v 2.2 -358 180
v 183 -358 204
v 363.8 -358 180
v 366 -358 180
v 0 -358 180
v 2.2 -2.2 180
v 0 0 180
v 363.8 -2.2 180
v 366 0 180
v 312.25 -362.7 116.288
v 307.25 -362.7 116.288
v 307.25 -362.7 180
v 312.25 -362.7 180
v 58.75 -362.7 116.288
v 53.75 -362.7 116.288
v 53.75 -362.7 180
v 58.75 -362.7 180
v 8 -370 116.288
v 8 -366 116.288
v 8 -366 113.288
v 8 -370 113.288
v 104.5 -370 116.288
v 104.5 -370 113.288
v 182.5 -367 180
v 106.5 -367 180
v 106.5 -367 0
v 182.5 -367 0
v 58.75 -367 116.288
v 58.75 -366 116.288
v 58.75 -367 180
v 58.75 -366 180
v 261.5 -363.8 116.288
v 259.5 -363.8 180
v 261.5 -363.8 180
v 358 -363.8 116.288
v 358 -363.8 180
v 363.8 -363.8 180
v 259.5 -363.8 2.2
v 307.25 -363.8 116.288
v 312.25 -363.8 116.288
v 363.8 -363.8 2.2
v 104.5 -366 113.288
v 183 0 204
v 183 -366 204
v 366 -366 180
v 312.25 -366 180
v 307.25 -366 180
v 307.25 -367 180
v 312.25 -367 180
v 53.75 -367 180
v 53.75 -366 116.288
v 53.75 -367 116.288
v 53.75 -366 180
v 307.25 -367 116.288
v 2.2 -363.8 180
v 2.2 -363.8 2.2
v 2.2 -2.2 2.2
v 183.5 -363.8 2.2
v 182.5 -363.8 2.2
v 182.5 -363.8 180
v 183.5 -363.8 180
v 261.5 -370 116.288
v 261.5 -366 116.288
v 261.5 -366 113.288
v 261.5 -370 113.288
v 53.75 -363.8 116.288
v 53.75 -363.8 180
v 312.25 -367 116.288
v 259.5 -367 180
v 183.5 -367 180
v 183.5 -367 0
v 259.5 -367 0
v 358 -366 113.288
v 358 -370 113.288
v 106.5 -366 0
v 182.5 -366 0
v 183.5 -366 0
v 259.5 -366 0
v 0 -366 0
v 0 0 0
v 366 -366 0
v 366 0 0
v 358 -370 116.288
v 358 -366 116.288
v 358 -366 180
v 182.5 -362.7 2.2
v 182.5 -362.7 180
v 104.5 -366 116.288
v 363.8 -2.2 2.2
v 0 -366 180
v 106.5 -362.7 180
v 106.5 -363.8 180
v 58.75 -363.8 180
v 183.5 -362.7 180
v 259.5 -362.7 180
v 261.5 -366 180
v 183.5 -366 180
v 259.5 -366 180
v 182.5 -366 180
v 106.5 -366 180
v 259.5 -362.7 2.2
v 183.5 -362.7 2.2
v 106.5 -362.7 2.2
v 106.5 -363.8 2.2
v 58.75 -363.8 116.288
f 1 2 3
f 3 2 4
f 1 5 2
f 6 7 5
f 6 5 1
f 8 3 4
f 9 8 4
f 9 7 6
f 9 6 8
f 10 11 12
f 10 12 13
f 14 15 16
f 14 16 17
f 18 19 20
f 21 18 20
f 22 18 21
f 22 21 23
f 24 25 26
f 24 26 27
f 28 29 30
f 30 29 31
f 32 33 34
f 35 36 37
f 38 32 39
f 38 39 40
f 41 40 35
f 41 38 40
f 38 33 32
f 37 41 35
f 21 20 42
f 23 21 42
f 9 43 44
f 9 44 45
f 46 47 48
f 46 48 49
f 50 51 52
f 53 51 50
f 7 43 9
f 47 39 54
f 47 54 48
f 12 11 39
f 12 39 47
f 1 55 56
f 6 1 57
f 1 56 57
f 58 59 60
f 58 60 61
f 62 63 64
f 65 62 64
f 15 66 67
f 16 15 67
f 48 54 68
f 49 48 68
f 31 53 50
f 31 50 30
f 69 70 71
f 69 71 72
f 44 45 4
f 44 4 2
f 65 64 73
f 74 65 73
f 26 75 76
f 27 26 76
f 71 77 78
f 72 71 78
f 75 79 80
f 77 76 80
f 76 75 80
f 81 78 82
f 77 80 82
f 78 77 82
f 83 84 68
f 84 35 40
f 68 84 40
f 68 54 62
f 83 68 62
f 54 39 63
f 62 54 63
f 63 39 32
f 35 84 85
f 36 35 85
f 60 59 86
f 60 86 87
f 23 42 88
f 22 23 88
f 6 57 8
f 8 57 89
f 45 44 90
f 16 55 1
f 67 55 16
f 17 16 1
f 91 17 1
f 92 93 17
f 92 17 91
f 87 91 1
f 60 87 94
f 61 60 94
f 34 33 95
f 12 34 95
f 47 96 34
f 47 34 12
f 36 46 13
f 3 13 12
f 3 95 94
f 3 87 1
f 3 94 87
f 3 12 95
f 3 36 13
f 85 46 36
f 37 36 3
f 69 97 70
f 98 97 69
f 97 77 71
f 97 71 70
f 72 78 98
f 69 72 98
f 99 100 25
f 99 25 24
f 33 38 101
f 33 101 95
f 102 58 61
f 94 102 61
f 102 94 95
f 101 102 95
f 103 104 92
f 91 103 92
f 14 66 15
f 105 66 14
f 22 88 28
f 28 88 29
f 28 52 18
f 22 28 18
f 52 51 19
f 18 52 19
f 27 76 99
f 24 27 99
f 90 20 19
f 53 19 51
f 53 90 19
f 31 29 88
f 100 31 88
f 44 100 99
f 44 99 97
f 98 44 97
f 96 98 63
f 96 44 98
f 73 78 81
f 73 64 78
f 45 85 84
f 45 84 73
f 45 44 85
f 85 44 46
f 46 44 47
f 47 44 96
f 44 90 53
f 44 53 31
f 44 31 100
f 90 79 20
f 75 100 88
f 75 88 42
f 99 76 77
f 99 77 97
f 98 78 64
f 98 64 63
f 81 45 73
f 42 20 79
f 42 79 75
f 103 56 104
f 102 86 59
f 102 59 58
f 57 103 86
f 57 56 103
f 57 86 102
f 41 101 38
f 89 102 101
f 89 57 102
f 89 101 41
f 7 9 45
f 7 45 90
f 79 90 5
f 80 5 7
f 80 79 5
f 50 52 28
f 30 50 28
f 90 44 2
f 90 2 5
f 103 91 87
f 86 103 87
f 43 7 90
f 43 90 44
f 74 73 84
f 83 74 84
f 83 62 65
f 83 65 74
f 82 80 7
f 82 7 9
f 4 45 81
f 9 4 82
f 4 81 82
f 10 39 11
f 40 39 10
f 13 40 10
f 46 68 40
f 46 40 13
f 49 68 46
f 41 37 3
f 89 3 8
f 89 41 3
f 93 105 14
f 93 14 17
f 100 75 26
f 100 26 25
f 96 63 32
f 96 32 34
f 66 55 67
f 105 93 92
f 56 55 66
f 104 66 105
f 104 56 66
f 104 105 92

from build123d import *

# Parameters (mm, degrees)
F0_W          = 366
F0_H          = 366
F0_W_2        = 361.6
F0_H_2        = 361.6
F1_DEPTH      = 180
F2_DEPTH      = 2.2
F3_W          = 76
F3_H          = 180
F3_W_2        = 5
F3_H_2        = 63.7124854326
F4_DEPTH      = 1
F4_DEPTH_BACK = 3.3
F3_W_3        = 45.75
F5_DEPTH      = 25
F6_DEPTH      = 8
F7_DEPTH      = 4
F9_DEPTH      = 366


# Not quite as in the source:
# - a feature names something its author has since deleted; it is built from what else it names


with BuildPart() as f1:
    # F0 (on Top) → F1 (new body)
    with BuildSketch(Plane.XY):
        with Locations((183, -183)):
            Rectangle(F0_W, F0_H)
        with Locations((183, -183)):
            Rectangle(F0_W_2, F0_H_2, mode=Mode.SUBTRACT)
    extrude(amount=F1_DEPTH)

    # F0 (on Top) → F2 (join)
    with BuildSketch(Plane.XY):
        with Locations((183, -183)):
            Rectangle(F0_W_2, F0_H_2)
    extrude(amount=F2_DEPTH)

    # F3 (on face) → F4 (join, two sides)
    with BuildSketch(Plane.XZ.offset(366)) as f4_sk:
        with Locations((144.5, 90)):
            Rectangle(F3_W, F3_H)
        with Locations((221.5, 90)):
            Rectangle(F3_W, F3_H)
        with Locations((56.25, 148.1437572837)):
            Rectangle(F3_W_2, F3_H_2)
        with Locations((309.75, 148.1437572837)):
            Rectangle(F3_W_2, F3_H_2)
    extrude(amount=F4_DEPTH)
    extrude(f4_sk.sketch, amount=-F4_DEPTH_BACK)

    # F3 (on face) → F5 (cut)
    with BuildSketch(Plane.XZ.offset(366)):
        Polygon((104.5, 180), (106.5, 180), (182.5, 180), (183.5, 180), (259.5, 180), (261.5, 180), (307.25, 180), (312.25, 180), (358, 180), (366, 180), (183, 204), (0, 180), (8, 180), (53.75, 180), (58.75, 180), align=None)
        with Locations((284.375, 148.1437572837)):
            Rectangle(F3_W_3, F3_H_2)
        with Locations((335.125, 148.1437572837)):
            Rectangle(F3_W_3, F3_H_2)
    extrude(amount=-F5_DEPTH, mode=Mode.SUBTRACT)

    # F3 (on face) → F6 (join)
    with BuildSketch(Plane.XZ.offset(366)):
        Polygon((104.5, 180), (106.5, 180), (182.5, 180), (183.5, 180), (259.5, 180), (261.5, 180), (307.25, 180), (312.25, 180), (358, 180), (366, 180), (183, 204), (0, 180), (8, 180), (53.75, 180), (58.75, 180), align=None)
    extrude(amount=-F6_DEPTH)

    # F3 (on face) → F7 (join)
    with BuildSketch(Plane.XZ.offset(366)):
        Polygon((307.25, 116.2875145674), (261.5, 116.2875145674), (261.5, 113.2875145674), (358, 113.2875145674), (358, 116.2875145674), (312.25, 116.2875145674), align=None)
        Polygon((104.5, 113.2875145674), (104.5, 116.2875145674), (58.75, 116.2875145674), (53.75, 116.2875145674), (8, 116.2875145674), (8, 113.2875145674), align=None)
    extrude(amount=F7_DEPTH)


with BuildPart() as f9:
    # F8 (on face) → F9 (new body)
    with BuildSketch(Plane(origin=(0, 0, 0), x_dir=(-1, 0, 0), z_dir=(0, 1, 0))):
        Polygon((-183, 204), (-366, 180), (0, 180), align=None)
    extrude(amount=-F9_DEPTH)


solid = Compound([f1.part, f9.part])
